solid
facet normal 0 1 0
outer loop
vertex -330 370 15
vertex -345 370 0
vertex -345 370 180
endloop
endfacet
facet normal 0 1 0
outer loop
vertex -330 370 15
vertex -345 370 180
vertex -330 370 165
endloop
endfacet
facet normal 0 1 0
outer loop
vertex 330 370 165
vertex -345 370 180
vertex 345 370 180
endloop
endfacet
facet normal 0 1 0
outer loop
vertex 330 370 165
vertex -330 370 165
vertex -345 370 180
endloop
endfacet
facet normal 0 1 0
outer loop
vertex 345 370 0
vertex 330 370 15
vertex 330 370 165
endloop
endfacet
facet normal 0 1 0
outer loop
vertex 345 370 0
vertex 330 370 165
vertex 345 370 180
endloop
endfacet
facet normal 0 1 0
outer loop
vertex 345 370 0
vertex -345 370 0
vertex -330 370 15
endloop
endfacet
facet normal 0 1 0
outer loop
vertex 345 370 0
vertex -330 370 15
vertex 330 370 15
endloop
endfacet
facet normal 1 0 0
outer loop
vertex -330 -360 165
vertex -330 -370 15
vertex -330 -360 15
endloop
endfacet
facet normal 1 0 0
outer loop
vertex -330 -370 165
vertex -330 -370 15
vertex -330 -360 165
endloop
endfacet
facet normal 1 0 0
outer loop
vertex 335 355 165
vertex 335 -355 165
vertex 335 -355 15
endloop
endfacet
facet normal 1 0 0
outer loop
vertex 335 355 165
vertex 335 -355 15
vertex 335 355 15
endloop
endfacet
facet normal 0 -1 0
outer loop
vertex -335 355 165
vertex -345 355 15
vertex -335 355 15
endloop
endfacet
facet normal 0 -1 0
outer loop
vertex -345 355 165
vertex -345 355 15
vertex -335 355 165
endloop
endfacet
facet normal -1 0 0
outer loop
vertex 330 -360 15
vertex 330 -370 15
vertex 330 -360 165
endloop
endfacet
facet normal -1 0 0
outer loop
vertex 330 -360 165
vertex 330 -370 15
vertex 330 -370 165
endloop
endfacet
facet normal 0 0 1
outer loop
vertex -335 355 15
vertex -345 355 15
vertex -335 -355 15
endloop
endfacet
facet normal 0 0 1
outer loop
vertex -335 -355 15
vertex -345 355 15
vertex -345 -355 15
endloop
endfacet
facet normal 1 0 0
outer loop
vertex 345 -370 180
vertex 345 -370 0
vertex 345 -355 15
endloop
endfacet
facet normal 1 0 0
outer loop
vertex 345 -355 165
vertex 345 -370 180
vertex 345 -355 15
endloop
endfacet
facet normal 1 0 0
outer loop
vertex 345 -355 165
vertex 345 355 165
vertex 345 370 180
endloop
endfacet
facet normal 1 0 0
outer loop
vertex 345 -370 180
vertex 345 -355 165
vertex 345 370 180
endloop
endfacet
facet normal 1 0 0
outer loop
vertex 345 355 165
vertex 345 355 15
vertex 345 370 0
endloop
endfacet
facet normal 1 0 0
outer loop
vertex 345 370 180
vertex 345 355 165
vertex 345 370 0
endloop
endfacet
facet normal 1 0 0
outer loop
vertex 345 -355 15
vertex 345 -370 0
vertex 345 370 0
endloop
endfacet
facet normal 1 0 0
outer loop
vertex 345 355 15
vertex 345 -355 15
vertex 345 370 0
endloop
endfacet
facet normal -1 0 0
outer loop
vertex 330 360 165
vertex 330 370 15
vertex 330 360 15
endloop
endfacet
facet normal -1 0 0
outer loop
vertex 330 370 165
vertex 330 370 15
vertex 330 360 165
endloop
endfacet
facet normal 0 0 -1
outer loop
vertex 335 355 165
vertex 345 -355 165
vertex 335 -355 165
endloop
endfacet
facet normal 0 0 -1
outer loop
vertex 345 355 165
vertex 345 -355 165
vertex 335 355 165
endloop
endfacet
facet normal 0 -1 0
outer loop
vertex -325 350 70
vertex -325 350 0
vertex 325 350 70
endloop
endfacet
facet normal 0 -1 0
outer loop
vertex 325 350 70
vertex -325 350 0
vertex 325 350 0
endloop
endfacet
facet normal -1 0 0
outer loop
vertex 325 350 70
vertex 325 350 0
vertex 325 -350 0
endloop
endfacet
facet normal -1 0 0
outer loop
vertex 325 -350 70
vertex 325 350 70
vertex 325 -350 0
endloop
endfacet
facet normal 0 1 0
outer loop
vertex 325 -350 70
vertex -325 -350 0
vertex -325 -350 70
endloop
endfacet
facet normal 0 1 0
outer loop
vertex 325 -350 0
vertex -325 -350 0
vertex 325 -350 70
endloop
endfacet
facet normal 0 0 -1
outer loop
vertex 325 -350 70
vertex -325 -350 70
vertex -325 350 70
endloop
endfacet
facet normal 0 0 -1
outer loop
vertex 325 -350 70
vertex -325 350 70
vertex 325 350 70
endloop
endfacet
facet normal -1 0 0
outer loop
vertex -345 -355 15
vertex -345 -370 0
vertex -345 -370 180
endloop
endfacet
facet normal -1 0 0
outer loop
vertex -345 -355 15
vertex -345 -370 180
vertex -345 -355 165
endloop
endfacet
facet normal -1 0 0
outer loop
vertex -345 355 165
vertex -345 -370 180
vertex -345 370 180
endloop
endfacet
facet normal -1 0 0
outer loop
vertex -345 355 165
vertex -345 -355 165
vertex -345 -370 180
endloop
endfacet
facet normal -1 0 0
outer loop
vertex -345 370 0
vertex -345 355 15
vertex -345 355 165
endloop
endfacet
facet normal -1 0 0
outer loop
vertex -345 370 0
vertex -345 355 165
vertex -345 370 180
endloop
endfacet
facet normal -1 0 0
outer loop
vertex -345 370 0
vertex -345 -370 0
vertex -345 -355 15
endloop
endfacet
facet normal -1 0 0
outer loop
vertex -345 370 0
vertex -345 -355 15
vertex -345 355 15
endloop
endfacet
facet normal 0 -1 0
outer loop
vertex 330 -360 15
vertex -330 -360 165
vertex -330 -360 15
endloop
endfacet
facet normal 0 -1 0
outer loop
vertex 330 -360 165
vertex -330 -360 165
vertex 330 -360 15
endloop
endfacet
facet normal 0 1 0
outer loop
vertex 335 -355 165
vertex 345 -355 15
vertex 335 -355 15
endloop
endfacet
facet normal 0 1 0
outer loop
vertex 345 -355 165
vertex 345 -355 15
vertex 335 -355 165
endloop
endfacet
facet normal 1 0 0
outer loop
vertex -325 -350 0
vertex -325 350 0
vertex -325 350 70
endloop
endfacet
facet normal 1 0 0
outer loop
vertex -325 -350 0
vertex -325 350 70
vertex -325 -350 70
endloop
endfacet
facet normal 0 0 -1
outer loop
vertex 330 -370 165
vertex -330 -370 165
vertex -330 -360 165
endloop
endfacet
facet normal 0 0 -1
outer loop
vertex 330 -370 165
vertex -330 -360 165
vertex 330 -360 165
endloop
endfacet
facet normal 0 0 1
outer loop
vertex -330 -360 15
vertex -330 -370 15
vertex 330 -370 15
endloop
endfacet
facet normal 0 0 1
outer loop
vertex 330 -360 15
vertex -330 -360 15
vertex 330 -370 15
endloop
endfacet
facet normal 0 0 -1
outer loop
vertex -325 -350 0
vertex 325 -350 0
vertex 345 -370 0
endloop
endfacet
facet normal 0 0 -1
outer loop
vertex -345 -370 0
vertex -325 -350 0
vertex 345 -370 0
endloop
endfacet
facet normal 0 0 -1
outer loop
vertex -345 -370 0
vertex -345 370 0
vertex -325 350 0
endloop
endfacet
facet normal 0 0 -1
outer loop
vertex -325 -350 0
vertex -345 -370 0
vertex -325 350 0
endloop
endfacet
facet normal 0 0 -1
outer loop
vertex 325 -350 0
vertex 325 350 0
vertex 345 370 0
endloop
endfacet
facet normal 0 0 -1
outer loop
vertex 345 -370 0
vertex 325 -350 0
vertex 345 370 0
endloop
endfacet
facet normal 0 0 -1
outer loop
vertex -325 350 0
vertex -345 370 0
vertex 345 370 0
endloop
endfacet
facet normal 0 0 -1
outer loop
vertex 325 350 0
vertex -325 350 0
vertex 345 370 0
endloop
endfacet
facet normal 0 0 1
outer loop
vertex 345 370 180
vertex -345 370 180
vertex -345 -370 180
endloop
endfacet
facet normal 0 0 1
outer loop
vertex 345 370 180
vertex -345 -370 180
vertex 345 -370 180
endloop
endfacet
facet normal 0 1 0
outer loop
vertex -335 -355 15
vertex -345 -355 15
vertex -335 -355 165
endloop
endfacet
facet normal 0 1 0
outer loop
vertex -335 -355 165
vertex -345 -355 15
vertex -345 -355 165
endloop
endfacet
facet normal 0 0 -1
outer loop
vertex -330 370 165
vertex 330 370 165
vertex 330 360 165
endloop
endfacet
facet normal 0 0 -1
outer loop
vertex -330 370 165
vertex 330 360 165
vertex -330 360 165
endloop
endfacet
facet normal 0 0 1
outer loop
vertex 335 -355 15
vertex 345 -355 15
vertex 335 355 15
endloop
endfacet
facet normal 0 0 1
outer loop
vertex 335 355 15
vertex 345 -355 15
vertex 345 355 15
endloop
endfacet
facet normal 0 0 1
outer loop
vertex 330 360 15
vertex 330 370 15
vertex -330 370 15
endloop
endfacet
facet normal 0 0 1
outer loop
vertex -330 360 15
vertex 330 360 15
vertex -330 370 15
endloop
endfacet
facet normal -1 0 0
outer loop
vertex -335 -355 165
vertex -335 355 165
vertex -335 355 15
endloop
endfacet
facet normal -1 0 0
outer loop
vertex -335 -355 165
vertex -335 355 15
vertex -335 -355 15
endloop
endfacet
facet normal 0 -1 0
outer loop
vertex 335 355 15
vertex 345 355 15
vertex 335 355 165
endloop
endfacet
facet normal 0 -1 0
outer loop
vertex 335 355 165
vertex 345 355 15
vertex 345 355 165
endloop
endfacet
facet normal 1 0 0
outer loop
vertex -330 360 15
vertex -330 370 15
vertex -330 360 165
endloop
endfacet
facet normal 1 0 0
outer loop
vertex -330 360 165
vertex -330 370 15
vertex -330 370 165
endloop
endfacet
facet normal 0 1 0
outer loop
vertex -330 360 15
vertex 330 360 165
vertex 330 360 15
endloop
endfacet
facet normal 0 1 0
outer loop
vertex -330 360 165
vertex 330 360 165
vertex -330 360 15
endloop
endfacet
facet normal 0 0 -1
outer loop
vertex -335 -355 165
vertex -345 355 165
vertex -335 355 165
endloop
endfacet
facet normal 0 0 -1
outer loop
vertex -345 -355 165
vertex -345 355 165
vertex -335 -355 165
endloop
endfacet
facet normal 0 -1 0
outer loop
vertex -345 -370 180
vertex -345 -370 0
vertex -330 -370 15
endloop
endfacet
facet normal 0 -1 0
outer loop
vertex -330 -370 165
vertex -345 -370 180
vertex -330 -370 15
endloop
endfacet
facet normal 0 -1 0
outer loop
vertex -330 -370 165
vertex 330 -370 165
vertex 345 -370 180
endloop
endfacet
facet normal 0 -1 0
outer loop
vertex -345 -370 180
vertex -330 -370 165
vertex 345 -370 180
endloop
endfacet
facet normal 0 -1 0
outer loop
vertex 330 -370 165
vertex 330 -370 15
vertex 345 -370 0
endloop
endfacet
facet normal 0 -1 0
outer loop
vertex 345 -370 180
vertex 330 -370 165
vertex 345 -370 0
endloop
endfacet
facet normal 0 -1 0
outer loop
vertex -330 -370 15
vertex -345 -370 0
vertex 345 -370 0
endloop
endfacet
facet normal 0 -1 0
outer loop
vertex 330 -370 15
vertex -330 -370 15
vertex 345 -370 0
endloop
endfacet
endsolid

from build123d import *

# Parameters (mm, degrees)
F0_W      = 690
F0_H      = 740
F1_DEPTH  = 180
F2_W      = 650
F2_H      = 700
F3_DEPTH  = 70
F5_W      = 710
F5_H      = 150
F8_DEPTH  = 10
F7_W      = 660
F7_H      = 150
F9_DEPTH  = 10
F6_W      = 710
F6_H      = 150
F10_DEPTH = 10
F4_W      = 660
F4_H      = 150
F11_DEPTH = 10


with BuildPart() as f1:
    # F0 (on Top) → F1 (new body)
    with BuildSketch(Plane.XY):
        Rectangle(F0_W, F0_H)
    extrude(amount=F1_DEPTH)

    # F2 (on face) → F3 (cut)
    with BuildSketch(Plane(origin=(0, 0, 0), x_dir=(1, 0, 0), z_dir=(0, 0, -1))):
        Rectangle(F2_W, F2_H)
    extrude(amount=-F3_DEPTH, mode=Mode.SUBTRACT)

    # F5 (on face) → F8 (cut)
    with BuildSketch(Plane.YZ.offset(345)):
        with Locations((0, 90)):
            Rectangle(F5_W, F5_H)
    extrude(amount=-F8_DEPTH, mode=Mode.SUBTRACT)

    # F7 (on face) → F9 (cut)
    with BuildSketch(Plane(origin=(0, 370, 0), x_dir=(-1, 0, 0), z_dir=(0, 1, 0))):
        with Locations((0, 90)):
            Rectangle(F7_W, F7_H)
    extrude(amount=-F9_DEPTH, mode=Mode.SUBTRACT)

    # F6 (on face) → F10 (cut)
    with BuildSketch(Plane(origin=(-345, 0, 0), x_dir=(0, -1, 0), z_dir=(-1, 0, 0))):
        with Locations((0, 90)):
            Rectangle(F6_W, F6_H)
    extrude(amount=-F10_DEPTH, mode=Mode.SUBTRACT)

    # F4 (on face) → F11 (cut)
    with BuildSketch(Plane.XZ.offset(370)):
        with Locations((0, 90)):
            Rectangle(F4_W, F4_H)
    extrude(amount=-F11_DEPTH, mode=Mode.SUBTRACT)


solid = f1.part
